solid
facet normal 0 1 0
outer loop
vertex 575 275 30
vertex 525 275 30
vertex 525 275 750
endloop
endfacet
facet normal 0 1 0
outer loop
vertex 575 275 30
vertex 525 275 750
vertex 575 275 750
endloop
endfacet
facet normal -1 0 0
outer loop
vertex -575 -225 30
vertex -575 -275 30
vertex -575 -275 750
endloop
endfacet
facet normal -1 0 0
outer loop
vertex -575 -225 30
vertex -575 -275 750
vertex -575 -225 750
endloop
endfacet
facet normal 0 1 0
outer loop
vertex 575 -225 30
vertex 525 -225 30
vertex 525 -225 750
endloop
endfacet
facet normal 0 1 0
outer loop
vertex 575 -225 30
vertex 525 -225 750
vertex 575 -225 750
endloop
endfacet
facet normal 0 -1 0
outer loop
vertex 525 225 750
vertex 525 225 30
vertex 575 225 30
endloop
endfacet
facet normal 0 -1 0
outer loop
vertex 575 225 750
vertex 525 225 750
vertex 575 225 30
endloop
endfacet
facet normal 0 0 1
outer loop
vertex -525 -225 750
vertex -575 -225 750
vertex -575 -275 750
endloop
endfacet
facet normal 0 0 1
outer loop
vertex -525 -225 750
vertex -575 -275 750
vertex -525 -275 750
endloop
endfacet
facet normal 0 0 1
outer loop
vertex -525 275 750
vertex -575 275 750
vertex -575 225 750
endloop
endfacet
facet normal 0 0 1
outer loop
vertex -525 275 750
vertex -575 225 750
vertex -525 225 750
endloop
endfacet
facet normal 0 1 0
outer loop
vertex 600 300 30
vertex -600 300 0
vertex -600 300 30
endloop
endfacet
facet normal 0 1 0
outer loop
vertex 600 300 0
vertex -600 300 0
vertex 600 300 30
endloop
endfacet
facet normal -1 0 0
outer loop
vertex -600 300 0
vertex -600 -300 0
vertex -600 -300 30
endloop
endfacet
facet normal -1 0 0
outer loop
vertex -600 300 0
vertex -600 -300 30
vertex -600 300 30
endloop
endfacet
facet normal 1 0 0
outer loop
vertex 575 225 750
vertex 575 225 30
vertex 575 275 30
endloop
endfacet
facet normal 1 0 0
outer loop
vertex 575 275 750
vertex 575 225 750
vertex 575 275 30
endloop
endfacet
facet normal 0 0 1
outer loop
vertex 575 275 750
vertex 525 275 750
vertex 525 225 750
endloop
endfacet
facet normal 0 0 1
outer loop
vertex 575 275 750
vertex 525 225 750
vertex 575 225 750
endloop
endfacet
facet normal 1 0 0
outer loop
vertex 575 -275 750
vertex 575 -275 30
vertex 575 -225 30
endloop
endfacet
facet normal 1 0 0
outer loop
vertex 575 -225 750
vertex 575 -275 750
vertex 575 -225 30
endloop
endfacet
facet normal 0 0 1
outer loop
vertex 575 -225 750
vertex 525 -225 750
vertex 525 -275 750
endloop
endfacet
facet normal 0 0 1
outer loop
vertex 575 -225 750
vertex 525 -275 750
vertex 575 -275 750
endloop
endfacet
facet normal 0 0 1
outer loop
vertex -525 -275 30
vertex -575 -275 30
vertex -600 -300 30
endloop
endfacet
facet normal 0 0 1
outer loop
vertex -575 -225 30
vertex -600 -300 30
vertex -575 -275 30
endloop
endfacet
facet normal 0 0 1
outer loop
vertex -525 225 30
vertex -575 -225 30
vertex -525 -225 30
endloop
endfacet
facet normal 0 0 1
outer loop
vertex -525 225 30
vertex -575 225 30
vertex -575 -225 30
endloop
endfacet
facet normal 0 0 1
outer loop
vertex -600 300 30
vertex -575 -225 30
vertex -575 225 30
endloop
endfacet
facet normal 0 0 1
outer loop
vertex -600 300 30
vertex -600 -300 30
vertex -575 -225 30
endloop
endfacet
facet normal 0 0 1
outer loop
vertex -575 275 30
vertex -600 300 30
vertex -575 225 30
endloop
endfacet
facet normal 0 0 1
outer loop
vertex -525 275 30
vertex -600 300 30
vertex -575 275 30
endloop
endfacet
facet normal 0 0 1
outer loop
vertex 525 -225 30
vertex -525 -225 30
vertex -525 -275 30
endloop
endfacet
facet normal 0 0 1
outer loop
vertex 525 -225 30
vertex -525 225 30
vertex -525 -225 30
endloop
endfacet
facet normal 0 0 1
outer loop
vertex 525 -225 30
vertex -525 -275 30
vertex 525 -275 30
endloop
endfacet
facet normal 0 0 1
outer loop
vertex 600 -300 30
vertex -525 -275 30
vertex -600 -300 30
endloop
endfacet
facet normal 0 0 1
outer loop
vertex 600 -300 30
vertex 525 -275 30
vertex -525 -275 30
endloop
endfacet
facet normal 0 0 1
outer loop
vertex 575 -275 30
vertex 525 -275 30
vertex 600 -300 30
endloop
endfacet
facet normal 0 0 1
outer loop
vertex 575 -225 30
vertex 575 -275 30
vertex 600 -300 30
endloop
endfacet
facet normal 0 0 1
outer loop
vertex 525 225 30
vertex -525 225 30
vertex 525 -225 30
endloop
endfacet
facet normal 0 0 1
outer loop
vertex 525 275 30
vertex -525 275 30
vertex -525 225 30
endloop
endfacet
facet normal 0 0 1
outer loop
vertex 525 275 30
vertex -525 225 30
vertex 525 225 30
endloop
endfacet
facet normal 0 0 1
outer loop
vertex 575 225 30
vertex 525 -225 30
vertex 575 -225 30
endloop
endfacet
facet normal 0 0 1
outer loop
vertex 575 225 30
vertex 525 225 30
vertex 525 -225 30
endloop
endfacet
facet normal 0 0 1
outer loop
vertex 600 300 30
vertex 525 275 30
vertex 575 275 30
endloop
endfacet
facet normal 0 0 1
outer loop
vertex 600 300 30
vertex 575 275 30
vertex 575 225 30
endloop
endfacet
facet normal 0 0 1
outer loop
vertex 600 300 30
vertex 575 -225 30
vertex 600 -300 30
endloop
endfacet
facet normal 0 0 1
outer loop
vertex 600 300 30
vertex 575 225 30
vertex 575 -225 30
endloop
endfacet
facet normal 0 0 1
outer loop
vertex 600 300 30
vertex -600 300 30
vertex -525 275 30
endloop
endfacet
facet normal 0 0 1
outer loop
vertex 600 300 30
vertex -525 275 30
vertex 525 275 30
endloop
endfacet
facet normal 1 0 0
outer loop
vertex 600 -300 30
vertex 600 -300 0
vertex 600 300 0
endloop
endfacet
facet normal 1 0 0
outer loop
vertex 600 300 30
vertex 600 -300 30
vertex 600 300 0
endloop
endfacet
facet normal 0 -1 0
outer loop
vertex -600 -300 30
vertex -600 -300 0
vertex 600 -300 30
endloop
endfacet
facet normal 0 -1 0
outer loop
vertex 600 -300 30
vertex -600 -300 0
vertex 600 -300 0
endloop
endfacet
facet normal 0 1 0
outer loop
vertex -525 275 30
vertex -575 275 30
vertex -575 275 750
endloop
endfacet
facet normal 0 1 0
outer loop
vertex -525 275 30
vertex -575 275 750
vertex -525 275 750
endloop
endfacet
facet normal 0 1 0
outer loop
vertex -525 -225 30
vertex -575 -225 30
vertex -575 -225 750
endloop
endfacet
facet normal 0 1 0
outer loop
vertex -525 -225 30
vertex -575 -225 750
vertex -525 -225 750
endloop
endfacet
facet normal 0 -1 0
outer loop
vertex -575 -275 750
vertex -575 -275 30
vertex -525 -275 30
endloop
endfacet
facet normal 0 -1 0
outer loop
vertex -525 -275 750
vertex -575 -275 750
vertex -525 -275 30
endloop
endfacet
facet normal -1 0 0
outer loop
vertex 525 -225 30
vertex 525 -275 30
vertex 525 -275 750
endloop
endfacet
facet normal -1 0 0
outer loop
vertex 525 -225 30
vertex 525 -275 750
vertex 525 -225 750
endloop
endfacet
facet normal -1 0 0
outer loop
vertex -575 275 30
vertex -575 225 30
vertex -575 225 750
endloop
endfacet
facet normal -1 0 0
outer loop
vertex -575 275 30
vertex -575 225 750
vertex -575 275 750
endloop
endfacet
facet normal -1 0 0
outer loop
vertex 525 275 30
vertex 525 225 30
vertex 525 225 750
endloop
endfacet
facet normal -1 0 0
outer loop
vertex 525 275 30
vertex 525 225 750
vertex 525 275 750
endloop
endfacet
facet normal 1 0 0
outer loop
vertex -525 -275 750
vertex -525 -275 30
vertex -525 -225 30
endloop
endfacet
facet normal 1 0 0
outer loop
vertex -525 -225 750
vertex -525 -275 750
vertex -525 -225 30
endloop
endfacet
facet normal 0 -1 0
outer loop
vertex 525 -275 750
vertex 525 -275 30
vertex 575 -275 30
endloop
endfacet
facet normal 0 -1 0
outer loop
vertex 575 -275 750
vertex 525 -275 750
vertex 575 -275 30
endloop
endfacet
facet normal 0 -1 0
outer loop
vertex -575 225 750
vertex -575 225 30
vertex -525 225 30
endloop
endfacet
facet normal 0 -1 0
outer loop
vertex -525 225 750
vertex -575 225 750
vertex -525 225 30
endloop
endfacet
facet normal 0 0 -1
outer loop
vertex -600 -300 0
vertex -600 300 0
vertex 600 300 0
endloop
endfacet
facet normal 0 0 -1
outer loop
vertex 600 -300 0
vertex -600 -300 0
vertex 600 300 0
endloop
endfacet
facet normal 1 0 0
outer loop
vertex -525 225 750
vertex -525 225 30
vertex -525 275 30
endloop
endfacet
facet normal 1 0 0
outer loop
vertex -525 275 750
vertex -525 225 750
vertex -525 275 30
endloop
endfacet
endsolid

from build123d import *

# Parameters (mm, degrees)
SKETCH_1_W      = 1200
SKETCH_1_H      = 600
EXTRUDE_1_DEPTH = 30
SKETCH_2_W      = 50
SKETCH_2_H      = 50
EXTRUDE_2_DEPTH = 750
SKETCH_3_W      = 50
SKETCH_3_H      = 50
EXTRUDE_3_DEPTH = 750
SKETCH_4_W      = 50
SKETCH_4_H      = 50
EXTRUDE_4_DEPTH = 750
SKETCH_5_W      = 50
SKETCH_5_H      = 50
EXTRUDE_5_DEPTH = 750


with BuildPart() as part:
    # 草图1 → 凸台-拉伸1 (new body)
    with BuildSketch(Plane.XY):
        Rectangle(SKETCH_1_W, SKETCH_1_H)
    extrude(amount=EXTRUDE_1_DEPTH)

    # 草图2 → 凸台-拉伸2 (add)
    with BuildSketch(Plane.XY):
        with Locations((-550, -250)):
            Rectangle(SKETCH_2_W, SKETCH_2_H)
    extrude(amount=EXTRUDE_2_DEPTH)

    # 草图3 → 凸台-拉伸3 (add)
    with BuildSketch(Plane.XY):
        with Locations((550, -250)):
            Rectangle(SKETCH_3_W, SKETCH_3_H)
    extrude(amount=EXTRUDE_3_DEPTH)

    # 草图4 → 凸台-拉伸4 (add)
    with BuildSketch(Plane.XY):
        with Locations((-550, 250)):
            Rectangle(SKETCH_4_W, SKETCH_4_H)
    extrude(amount=EXTRUDE_4_DEPTH)

    # 草图5 → 凸台-拉伸5 (add)
    with BuildSketch(Plane.XY):
        with Locations((550, 250)):
            Rectangle(SKETCH_5_W, SKETCH_5_H)
    extrude(amount=EXTRUDE_5_DEPTH)


solid = part.part
